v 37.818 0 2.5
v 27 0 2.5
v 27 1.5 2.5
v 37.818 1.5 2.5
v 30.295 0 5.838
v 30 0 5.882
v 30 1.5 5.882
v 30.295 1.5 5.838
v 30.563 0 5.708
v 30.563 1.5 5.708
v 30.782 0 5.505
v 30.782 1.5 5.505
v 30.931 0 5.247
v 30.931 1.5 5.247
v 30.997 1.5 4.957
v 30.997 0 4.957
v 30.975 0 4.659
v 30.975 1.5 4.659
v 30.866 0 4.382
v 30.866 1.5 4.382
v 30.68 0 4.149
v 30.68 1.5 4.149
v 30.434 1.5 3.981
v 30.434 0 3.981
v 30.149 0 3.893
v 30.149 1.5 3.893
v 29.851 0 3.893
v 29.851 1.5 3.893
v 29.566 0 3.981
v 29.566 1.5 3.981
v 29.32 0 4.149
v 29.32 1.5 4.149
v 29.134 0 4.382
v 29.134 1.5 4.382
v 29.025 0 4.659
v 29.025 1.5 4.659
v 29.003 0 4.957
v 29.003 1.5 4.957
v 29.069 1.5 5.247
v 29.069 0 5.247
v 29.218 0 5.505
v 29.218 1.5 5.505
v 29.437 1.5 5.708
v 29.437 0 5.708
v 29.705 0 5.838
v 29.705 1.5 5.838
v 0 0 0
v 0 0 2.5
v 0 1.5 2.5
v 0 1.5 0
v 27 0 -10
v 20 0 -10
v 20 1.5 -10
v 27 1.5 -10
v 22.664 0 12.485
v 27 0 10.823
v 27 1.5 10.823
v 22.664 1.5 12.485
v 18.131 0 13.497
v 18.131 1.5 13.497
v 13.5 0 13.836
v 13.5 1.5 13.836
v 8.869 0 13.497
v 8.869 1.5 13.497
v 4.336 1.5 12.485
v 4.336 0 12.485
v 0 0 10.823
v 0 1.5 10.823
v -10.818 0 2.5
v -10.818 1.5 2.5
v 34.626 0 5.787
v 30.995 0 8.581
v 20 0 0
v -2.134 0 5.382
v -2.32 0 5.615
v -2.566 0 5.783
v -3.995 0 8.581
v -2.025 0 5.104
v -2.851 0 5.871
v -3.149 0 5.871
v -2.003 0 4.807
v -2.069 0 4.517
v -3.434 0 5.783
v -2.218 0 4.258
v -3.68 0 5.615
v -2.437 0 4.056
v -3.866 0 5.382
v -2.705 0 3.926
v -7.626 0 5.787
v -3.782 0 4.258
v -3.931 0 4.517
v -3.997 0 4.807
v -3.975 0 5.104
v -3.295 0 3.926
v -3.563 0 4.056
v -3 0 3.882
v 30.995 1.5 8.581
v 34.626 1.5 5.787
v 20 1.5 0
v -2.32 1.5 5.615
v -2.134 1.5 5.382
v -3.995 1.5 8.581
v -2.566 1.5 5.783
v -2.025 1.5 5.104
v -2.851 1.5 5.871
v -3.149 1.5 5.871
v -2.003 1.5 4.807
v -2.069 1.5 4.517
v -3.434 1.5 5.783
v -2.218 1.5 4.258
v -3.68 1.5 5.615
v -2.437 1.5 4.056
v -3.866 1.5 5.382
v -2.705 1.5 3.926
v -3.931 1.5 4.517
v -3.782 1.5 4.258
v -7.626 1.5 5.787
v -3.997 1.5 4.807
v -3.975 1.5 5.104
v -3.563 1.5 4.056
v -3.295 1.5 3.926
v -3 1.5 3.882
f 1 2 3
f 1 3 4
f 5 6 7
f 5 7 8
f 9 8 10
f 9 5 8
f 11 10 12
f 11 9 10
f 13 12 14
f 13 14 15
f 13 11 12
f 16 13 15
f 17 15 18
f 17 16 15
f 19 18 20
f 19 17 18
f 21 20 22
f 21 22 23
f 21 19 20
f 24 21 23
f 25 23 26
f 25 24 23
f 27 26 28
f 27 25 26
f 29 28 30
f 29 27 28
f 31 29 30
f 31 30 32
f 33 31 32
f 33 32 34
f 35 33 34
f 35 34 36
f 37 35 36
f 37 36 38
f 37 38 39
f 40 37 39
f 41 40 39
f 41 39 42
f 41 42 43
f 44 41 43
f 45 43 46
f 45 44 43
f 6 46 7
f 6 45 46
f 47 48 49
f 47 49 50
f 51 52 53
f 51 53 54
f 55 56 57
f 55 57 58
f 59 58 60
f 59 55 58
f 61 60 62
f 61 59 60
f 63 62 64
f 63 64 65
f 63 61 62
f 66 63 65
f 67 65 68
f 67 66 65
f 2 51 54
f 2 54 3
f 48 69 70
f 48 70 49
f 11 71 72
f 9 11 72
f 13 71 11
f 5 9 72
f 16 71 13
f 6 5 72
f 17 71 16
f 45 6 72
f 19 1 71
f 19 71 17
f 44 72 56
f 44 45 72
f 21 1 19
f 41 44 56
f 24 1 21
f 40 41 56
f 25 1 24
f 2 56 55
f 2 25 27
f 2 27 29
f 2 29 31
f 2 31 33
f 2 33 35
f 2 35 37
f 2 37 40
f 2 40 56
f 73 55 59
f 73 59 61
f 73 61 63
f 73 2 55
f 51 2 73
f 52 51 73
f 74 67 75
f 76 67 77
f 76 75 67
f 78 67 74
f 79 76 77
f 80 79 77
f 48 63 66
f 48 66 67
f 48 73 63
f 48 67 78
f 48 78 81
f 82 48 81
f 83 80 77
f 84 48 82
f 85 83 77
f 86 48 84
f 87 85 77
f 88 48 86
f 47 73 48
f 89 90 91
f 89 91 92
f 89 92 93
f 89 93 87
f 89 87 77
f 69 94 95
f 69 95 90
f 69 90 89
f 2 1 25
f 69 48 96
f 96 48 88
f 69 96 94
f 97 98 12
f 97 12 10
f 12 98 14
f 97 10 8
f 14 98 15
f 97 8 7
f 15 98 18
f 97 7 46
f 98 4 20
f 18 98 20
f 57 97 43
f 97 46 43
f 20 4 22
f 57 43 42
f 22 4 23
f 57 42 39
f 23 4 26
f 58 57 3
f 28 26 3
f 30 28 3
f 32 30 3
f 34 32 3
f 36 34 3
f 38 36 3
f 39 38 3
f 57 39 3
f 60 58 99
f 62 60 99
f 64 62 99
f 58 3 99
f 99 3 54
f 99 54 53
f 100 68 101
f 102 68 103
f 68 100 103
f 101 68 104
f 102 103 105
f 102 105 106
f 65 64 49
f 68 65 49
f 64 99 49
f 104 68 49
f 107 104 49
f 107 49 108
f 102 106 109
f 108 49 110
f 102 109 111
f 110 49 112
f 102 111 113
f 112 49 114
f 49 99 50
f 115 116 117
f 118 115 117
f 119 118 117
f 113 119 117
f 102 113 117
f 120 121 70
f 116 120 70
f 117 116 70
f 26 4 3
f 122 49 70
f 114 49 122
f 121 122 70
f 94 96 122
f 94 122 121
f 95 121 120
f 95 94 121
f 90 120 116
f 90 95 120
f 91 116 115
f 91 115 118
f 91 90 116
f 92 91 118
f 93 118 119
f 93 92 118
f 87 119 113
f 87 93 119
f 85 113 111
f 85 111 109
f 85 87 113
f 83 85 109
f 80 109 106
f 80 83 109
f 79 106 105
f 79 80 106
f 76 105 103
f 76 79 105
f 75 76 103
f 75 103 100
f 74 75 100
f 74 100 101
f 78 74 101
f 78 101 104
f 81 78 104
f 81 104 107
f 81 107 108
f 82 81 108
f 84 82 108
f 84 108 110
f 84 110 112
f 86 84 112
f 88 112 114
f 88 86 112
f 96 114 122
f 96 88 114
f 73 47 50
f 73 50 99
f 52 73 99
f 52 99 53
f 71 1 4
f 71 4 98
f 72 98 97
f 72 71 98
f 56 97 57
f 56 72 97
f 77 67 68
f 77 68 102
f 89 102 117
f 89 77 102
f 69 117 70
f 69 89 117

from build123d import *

# Parameters (mm, degrees)
SKETCH1_R           = 1
BOSS_EXTRUDE1_DEPTH = 1.5


with BuildPart() as part:
    # Sketch1 → Boss-Extrude1 (new body)
    with BuildSketch(Plane(origin=(0, 0, 0), x_dir=(1, 0, 0), z_dir=(0, 1, 0))):
        with BuildLine():
            Line((0, 0), (20, 0))
            Line((20, 0), (20, 10))
            Line((20, 10), (27, 10))
            Line((27, 10), (27, 0))
            Line((27, 0), (27, -2.5))
            Line((27, -2.5), (37.817581496, -2.5))
            ThreePointArc((37.817581496, -2.5), (32.861344207, -7.249817199), (27, -10.823288281))
            ThreePointArc((27, -10.823288281), (13.5, -13.83633472), (0, -10.823288281))
            ThreePointArc((0, -10.823288281), (-5.861344207, -7.249817199), (-10.817581496, -2.5))
            Line((-10.817581496, -2.5), (0, -2.5))
            Line((0, -2.5), (0, 0))
        make_face()
        with Locations(Location((30, -4.881961213, 0), (0, 0, 270))):
            Circle(SKETCH1_R, mode=Mode.SUBTRACT)
        with Locations(Location((-3, -4.881961213, 0), (0, 0, 90))):
            Circle(SKETCH1_R, mode=Mode.SUBTRACT)
    extrude(amount=BOSS_EXTRUDE1_DEPTH)


solid = part.part
